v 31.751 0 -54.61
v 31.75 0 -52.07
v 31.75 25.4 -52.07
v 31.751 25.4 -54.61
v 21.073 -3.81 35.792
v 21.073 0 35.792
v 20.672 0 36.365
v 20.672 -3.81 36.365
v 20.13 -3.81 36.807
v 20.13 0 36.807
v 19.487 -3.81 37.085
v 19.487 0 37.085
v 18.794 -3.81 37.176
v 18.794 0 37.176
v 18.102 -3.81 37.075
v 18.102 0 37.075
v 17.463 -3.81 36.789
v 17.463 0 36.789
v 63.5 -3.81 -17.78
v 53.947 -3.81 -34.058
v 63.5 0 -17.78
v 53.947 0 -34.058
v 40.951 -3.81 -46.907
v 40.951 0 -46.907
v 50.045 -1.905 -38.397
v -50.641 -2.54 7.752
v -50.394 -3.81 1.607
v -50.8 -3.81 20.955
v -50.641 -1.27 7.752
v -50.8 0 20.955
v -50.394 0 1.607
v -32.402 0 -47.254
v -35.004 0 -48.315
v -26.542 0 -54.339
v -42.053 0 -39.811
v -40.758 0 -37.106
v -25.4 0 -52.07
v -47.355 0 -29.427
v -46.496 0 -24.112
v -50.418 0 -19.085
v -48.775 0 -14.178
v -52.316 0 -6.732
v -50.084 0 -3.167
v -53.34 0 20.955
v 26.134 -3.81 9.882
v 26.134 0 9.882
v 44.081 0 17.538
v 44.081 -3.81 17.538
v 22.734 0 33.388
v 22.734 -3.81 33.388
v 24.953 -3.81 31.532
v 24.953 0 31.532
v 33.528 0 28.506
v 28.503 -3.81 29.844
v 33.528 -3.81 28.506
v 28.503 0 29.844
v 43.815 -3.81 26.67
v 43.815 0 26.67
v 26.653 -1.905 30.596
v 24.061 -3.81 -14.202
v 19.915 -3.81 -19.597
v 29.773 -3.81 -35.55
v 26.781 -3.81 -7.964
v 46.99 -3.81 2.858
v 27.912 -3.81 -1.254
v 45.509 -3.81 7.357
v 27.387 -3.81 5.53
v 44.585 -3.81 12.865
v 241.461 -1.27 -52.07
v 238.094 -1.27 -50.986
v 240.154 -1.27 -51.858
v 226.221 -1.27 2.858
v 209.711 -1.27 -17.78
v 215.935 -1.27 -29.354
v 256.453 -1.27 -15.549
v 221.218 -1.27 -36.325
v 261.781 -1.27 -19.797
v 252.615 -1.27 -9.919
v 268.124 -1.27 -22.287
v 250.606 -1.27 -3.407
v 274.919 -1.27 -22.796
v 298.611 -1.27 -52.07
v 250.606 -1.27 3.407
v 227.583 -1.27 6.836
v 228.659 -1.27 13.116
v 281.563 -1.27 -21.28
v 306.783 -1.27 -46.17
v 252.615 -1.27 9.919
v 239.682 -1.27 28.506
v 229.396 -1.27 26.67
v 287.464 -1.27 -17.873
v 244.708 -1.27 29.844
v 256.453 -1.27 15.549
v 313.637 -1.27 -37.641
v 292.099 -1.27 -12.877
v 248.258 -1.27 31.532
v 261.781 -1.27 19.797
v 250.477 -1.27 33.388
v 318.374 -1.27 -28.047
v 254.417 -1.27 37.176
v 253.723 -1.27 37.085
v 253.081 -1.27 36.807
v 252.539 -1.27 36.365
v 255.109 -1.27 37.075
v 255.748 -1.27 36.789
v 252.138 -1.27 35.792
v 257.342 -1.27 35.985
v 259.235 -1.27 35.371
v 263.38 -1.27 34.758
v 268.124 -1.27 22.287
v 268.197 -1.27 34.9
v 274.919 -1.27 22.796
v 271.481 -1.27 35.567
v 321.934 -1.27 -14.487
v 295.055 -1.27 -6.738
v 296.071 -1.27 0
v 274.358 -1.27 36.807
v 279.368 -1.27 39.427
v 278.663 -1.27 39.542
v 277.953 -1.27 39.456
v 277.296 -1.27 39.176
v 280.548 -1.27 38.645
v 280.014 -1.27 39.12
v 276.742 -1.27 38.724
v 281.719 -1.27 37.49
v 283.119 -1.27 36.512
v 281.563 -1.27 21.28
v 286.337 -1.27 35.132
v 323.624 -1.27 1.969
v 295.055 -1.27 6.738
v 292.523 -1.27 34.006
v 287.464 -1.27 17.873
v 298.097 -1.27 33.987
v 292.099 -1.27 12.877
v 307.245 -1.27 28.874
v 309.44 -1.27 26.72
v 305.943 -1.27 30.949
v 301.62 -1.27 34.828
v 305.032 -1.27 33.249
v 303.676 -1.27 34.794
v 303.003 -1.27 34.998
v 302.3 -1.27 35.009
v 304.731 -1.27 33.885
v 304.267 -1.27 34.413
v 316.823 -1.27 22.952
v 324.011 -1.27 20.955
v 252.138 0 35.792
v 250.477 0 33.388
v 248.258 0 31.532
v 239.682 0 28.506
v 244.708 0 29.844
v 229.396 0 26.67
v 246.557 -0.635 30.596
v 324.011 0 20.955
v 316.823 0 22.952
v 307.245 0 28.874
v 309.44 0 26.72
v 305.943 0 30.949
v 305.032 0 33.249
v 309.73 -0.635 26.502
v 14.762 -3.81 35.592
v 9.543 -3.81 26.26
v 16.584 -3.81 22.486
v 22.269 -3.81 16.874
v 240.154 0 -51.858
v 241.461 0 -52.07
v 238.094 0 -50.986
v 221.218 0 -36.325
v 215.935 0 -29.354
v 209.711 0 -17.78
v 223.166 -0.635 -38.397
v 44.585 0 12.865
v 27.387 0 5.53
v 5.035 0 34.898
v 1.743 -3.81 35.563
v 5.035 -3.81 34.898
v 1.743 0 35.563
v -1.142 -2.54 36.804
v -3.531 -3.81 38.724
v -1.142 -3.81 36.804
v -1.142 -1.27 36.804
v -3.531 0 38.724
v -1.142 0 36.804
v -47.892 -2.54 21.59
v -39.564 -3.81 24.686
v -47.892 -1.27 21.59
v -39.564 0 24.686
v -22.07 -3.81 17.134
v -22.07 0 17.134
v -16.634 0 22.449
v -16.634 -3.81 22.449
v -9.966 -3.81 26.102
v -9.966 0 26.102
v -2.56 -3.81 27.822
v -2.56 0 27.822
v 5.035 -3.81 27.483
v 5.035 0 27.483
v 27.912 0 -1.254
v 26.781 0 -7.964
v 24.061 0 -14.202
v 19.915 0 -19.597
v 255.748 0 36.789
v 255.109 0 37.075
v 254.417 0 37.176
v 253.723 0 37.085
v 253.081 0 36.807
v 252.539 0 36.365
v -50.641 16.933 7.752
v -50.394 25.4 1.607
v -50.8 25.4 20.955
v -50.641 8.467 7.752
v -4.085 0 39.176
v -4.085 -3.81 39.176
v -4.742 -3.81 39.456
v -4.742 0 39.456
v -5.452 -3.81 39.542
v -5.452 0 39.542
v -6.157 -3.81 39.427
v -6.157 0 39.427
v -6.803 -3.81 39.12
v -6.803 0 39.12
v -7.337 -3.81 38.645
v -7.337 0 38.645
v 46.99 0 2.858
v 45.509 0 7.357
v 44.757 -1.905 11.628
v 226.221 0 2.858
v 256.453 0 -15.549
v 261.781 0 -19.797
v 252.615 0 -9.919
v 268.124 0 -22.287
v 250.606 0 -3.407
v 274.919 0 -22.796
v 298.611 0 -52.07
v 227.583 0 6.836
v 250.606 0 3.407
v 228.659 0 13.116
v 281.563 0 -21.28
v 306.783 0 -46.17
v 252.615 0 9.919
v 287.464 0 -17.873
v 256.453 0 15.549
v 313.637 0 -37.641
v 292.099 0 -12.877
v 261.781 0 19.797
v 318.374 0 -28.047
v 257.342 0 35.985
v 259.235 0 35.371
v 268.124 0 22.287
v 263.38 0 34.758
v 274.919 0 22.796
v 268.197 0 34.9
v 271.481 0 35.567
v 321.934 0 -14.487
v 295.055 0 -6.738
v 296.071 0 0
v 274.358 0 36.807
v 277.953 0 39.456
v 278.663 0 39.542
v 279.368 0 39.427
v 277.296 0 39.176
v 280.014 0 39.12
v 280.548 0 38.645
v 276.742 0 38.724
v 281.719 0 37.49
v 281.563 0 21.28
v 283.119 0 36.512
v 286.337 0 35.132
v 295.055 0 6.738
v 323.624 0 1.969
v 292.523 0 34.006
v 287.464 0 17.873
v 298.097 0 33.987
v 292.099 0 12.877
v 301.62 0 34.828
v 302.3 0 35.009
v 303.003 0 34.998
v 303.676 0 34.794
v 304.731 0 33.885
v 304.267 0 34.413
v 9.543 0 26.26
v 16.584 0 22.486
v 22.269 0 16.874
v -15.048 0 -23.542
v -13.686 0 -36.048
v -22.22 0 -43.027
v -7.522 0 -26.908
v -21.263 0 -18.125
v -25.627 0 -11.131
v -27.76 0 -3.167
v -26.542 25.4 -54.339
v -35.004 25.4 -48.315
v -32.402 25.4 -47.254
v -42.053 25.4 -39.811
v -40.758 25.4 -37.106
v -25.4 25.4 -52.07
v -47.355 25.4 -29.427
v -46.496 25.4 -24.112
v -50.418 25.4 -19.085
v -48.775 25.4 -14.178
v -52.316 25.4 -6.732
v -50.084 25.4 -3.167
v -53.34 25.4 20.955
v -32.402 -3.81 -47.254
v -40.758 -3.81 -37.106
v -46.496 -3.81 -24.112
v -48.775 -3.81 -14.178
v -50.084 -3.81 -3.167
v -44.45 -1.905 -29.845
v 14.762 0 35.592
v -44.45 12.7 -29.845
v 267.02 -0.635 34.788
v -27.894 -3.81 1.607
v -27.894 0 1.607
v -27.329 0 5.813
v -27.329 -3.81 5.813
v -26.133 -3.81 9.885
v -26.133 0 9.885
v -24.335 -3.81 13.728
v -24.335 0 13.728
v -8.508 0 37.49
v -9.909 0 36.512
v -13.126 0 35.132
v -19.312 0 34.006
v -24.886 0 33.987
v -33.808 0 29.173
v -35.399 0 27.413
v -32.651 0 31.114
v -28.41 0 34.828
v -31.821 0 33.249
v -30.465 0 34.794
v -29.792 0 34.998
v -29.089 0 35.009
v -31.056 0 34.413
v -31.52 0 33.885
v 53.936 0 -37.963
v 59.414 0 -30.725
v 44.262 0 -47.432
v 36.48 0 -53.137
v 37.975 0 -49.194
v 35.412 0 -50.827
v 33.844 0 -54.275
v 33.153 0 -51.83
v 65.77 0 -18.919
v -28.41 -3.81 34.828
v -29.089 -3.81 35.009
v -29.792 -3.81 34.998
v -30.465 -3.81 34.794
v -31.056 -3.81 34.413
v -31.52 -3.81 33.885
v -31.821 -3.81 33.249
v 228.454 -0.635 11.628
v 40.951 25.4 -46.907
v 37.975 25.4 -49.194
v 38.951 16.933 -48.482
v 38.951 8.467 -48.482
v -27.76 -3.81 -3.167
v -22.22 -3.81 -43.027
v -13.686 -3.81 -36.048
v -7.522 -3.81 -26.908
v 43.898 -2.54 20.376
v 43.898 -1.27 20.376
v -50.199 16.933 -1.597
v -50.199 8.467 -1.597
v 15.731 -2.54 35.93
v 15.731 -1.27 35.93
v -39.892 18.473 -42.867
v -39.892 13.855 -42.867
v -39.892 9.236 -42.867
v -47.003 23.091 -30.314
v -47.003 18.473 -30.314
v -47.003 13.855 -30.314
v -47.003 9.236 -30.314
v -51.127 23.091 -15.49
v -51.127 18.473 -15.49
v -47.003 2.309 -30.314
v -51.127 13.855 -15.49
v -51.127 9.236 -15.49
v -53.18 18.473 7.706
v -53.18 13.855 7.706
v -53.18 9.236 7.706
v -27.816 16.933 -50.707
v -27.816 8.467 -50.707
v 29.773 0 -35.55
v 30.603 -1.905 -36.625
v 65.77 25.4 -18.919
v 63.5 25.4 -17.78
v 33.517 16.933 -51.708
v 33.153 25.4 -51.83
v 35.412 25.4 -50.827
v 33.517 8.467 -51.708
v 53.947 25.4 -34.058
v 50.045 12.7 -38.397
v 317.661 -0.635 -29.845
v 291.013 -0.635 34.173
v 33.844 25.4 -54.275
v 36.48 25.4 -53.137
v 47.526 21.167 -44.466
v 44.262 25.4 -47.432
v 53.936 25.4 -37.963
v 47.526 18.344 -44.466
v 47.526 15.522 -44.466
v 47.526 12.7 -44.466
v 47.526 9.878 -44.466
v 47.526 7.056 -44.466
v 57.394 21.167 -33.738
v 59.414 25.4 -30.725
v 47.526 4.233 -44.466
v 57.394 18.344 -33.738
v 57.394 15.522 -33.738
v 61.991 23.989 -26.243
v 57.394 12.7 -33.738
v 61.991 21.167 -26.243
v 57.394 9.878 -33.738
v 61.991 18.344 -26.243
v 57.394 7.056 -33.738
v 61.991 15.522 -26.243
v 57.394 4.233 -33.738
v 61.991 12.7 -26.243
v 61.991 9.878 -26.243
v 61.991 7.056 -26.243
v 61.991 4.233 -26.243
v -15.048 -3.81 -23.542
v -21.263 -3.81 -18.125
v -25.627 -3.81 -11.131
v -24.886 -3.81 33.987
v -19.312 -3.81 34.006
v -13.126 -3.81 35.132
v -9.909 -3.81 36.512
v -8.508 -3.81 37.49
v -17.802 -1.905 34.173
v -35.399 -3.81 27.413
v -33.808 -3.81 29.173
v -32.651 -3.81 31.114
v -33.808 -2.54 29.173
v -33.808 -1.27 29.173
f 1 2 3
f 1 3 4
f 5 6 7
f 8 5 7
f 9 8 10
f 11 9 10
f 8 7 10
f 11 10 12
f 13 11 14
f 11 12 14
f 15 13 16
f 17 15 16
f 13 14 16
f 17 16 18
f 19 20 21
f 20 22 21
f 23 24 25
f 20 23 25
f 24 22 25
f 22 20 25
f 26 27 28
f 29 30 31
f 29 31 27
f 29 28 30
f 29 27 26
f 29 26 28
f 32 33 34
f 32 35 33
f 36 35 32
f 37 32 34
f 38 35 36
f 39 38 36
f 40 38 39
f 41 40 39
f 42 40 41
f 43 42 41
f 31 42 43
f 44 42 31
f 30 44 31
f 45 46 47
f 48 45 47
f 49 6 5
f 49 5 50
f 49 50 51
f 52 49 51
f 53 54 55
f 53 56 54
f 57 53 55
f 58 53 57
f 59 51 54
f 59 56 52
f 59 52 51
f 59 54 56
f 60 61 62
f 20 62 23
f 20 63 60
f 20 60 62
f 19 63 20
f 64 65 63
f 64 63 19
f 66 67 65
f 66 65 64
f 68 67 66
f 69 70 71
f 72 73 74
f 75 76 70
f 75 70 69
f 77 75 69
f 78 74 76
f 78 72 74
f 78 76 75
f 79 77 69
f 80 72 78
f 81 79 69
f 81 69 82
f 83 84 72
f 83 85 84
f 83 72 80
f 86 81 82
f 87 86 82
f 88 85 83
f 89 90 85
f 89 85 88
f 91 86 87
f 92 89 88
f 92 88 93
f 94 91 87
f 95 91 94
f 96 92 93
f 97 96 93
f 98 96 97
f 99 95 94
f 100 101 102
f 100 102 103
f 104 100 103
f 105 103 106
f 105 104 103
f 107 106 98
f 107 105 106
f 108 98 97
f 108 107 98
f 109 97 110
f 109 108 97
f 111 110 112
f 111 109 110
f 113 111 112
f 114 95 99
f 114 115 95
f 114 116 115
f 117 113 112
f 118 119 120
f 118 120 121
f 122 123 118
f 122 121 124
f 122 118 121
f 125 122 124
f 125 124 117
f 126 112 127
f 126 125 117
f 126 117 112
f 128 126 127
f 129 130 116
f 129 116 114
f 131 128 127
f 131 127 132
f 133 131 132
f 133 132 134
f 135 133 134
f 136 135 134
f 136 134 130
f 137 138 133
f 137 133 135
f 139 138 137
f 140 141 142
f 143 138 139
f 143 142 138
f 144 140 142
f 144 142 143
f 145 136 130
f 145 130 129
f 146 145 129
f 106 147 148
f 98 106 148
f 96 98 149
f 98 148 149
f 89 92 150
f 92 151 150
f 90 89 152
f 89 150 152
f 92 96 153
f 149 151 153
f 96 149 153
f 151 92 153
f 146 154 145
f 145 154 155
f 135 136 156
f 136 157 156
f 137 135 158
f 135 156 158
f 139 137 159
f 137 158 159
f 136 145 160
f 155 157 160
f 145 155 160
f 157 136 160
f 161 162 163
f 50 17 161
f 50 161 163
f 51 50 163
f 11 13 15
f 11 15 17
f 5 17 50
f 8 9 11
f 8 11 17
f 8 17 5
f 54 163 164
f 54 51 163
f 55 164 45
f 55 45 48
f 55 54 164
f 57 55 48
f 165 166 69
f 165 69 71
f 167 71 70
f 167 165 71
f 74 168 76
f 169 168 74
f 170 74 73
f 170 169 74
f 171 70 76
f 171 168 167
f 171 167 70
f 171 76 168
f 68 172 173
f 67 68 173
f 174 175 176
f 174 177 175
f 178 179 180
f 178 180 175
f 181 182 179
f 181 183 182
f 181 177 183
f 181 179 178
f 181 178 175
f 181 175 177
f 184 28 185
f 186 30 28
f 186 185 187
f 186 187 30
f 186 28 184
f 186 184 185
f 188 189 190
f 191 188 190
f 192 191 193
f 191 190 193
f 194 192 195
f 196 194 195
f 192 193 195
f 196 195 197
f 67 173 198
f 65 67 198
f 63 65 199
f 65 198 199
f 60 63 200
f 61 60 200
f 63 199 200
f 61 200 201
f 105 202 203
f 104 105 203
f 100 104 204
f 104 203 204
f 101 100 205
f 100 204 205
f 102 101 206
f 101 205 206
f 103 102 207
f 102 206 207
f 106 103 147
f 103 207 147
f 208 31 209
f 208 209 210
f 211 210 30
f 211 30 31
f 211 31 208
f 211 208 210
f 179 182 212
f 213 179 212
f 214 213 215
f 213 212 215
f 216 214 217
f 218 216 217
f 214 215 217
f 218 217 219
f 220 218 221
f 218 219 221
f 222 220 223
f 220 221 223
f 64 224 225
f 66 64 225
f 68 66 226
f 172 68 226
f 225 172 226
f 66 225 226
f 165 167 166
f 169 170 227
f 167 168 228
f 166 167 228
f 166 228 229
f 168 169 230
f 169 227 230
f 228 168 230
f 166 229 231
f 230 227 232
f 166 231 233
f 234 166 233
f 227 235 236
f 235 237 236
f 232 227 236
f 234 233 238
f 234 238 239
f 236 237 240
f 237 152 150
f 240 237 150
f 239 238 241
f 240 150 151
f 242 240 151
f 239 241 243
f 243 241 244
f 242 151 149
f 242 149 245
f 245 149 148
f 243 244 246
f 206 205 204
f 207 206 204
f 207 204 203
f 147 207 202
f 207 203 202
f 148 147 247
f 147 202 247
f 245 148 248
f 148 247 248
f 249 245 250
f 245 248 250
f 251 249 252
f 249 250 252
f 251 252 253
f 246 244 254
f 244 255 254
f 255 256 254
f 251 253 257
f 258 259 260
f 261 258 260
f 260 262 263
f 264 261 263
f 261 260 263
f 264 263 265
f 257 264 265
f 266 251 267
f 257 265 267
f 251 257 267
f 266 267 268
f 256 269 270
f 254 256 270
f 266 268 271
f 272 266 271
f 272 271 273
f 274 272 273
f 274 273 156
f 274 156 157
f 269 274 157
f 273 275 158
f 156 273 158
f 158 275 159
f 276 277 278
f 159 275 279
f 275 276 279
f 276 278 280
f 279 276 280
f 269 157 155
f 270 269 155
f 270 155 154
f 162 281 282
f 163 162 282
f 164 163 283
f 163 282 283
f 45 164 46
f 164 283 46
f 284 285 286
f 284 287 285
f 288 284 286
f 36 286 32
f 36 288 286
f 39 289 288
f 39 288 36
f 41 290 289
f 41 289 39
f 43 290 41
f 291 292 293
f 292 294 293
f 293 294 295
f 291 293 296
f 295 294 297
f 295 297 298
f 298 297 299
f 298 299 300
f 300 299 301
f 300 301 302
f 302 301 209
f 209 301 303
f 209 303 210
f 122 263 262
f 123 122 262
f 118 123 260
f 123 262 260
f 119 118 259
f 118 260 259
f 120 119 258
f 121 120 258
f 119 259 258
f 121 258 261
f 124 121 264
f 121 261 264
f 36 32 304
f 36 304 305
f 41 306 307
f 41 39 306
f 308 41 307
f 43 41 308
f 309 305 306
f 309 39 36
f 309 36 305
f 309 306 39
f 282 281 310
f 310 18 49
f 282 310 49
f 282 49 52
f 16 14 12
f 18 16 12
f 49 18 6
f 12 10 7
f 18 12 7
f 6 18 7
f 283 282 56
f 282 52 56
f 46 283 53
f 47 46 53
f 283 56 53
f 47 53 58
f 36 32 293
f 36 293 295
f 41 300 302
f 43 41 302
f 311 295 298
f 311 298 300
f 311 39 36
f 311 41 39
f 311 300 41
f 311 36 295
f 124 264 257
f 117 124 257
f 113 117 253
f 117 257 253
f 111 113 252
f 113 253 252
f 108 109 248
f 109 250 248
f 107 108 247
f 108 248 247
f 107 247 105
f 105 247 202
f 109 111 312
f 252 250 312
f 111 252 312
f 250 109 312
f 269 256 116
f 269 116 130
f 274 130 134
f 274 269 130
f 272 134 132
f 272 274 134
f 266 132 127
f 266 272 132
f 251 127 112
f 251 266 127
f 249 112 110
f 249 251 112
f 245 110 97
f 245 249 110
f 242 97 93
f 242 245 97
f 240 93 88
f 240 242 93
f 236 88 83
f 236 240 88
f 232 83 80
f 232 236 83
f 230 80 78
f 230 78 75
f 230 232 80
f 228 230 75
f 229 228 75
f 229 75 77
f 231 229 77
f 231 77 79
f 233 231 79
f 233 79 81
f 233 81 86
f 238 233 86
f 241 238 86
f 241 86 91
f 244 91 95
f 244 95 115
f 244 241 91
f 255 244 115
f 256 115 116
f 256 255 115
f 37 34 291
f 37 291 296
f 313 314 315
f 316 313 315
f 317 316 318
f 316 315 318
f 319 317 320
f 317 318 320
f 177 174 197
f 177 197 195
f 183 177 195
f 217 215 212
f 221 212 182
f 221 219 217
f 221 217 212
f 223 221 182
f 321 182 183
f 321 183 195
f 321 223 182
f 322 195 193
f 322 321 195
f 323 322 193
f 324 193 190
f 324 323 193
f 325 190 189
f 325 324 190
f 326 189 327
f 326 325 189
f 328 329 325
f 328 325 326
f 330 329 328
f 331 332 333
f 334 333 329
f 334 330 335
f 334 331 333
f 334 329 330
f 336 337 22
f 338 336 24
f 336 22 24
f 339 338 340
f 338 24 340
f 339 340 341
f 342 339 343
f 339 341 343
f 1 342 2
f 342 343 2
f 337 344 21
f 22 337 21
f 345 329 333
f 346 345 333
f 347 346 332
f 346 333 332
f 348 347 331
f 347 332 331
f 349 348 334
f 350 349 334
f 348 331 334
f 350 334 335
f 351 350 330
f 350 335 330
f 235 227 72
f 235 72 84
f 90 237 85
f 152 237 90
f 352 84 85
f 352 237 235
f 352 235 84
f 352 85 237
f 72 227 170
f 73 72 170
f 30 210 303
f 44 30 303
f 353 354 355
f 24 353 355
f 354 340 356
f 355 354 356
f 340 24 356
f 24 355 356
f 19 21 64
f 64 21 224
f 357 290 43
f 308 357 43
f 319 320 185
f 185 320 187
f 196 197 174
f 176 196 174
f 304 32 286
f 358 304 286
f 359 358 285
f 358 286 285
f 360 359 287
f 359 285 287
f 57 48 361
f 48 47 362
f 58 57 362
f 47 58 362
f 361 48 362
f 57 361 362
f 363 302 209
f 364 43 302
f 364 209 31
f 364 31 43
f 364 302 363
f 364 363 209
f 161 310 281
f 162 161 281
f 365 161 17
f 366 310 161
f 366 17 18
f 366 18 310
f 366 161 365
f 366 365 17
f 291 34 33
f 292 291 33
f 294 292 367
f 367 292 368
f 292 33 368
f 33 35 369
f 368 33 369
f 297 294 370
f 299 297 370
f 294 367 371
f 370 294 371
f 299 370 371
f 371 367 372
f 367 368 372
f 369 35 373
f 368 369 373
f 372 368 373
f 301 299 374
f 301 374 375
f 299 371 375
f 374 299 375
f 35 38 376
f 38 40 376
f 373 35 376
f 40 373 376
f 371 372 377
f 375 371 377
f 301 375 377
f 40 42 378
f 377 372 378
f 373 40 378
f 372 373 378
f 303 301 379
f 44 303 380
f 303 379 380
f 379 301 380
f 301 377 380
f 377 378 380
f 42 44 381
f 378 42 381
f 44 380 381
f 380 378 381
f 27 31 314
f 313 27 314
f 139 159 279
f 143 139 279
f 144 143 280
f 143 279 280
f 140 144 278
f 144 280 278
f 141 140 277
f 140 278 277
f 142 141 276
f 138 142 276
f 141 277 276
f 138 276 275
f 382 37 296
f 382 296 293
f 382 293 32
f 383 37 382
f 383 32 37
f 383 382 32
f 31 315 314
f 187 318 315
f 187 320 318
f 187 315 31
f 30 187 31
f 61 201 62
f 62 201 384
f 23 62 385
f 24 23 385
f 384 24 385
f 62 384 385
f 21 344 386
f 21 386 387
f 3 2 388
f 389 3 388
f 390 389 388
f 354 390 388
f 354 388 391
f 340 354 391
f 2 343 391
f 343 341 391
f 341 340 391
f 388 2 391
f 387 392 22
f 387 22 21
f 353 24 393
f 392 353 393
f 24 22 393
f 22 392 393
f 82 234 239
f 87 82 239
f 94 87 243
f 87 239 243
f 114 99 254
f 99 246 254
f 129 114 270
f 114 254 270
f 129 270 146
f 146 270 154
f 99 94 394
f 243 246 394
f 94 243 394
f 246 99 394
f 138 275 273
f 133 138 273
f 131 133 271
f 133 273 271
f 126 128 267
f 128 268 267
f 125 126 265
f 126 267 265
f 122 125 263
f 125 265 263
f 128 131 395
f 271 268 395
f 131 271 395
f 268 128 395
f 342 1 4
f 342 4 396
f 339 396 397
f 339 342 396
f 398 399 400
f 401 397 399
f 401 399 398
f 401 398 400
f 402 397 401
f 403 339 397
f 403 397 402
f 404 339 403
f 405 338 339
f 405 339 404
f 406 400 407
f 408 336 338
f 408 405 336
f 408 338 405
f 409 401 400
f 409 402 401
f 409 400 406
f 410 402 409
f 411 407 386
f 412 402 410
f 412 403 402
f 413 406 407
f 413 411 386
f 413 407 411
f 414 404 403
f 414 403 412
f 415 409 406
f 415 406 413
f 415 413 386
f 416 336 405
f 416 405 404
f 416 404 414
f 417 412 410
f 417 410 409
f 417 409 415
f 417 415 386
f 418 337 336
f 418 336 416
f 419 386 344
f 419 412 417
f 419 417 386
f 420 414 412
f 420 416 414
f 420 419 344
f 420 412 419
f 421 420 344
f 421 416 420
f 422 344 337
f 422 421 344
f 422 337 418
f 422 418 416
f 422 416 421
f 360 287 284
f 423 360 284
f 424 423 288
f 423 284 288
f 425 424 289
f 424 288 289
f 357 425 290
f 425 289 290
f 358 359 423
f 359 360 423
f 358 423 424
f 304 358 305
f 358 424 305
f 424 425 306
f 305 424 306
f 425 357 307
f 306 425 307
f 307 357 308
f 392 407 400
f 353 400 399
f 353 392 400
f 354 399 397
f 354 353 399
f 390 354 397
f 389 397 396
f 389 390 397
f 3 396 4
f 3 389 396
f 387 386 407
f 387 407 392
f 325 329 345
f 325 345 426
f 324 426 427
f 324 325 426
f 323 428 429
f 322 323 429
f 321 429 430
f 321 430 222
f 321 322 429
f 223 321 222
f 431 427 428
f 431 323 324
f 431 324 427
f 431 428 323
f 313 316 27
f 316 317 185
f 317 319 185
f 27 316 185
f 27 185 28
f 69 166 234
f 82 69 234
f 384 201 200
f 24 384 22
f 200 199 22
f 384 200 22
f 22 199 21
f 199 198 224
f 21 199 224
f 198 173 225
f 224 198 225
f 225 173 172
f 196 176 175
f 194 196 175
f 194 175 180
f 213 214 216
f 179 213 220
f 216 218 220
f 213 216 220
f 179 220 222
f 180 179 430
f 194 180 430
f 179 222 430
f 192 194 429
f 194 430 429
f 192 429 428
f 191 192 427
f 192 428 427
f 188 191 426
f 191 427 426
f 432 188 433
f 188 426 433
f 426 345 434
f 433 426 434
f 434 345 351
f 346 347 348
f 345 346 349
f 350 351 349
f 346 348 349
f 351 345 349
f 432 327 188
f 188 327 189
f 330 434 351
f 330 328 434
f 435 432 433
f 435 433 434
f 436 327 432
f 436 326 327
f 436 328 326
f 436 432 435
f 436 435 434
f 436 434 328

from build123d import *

# Parameters (mm, degrees)
F1_DEPTH = 3.81
F2_DEPTH = 25.4
F0_R     = 22.86
F3_DEPTH = 1.27


# Not quite as in the source:
# - the dataset's text gives a spline's control points without its knots; the knots are read off the source's solid


with BuildPart() as f1:
    # F0 (on Front) → F1 (new body)
    with BuildSketch(Plane.XZ):
        with BuildLine():
            add(Edge.make_bspline(
                [(-32.4015982609, -47.2542967092), (-37.3545101899, -42.8550868765), (-46.2039408348, -30.0827942932), (-49.2886590635, -13.3112173003), (-50.0835223991, -3.1672286712)],
                knots=[0.1324377854, 0.1324377854, 0.1324377854, 0.1324377854, 0.4305745002, 0.7612639779, 0.7612639779, 0.7612639779, 0.7612639779], degree=3))
            ThreePointArc((-32.4015982609, -47.2542967092), (-17.6981427389, -39.8494489219), (-7.5220542761, -26.90840574))
            ThreePointArc((-7.5220542761, -26.90840574), (-21.2629963717, -18.1253575219), (-27.7599038641, -3.1672286712))
            Line((-27.7599038641, -3.1672286712), (-50.0835223991, -3.1672286712))
        make_face()
    extrude(amount=F1_DEPTH)


with BuildPart() as f1b:
    # F0 (on Front) → F1, piece 2 (new body)
    with BuildSketch(Plane.XZ):
        with BuildLine():
            add(Edge.make_bspline(
                [(-50.3942953675, 1.6068994458), (-50.7116523317, 7.6046741304), (-50.8, 14.040708595), (-50.8, 20.955)],
                knots=[0.8121129163, 0.8121129163, 0.8121129163, 0.8121129163, 1, 1, 1, 1], degree=3))
            Line((-50.3942953675, 1.6068994458), (-27.8937533181, 1.6068994458))
            ThreePointArc((-27.8937533181, 1.6068994458), (-26.8082807521, 7.8714473331), (-24.3346381376, 13.728400734))
            Line((-24.3346381376, 13.728400734), (-39.5643113353, 24.685851328))
            add(Edge.make_bspline(
                [(-50.8, 20.955), (-48.7586294455, 21.2383932933), (-43.6710240911, 22.6255829589), (-39.5643113353, 24.685851328)],
                knots=[0, 0, 0, 0, 0.4195234448, 0.4195234448, 0.4195234448, 0.4195234448], degree=3))
        make_face()
    extrude(amount=F1_DEPTH)


with BuildPart() as f1c:
    # F0 (on Front) → F1, piece 3 (new body)
    with BuildSketch(Plane.XZ):
        with BuildLine():
            add(Edge.make_bspline(
                [(19.914929673, -19.5969175158), (23.6612726725, -25.9838738604), (29.5150758275, -36.8834797497), (37.494373544, -43.9061090328), (40.9513666547, -46.9066246366)],
                knots=[0, 0, 0, 0, 0.5400159495, 1, 1, 1, 1], degree=3))
            add(Edge.make_bspline(
                [(40.9513666547, -46.9066246366), (44.1733718974, -44.2593550986), (54.7370471064, -34.0134404836), (57.6018359563, -29.538032362), (63.5, -17.78)],
                knots=[0.2576942768, 0.2576942768, 0.2576942768, 0.2576942768, 0.4906190831, 1, 1, 1, 1], degree=3))
            Line((63.5, -17.78), (46.99, 2.8575))
            add(Edge.make_bspline(
                [(46.99, 2.8575), (45.862430977, 5.0832937801), (45.1728056088, 8.6289787064), (44.6399921579, 12.4485812477), (44.5846144842, 12.8645142485)],
                knots=[0, 0, 0, 0, 0.4365870001, 0.489378166, 0.489378166, 0.489378166, 0.489378166], degree=3))
            Line((44.5846144842, 12.8645142485), (27.3873225339, 5.5297526549))
            ThreePointArc((27.3873225339, 5.5297526549), (26.7808355812, -7.9643232966), (19.914929673, -19.5969175158))
        make_face()
    extrude(amount=F1_DEPTH)


with BuildPart() as f1d:
    # F0 (on Front) → F1, piece 4 (new body)
    with BuildSketch(Plane.XZ):
        with BuildLine():
            add(Edge.make_bspline(
                [(-35.3985657611, 27.4131491477), (-33.5545344545, 29.0862015789), (-32.5238587747, 31.0124628081), (-31.8214549811, 33.2492936319)],
                knots=[0.5850244101, 0.5850244101, 0.5850244101, 0.5850244101, 0.8620266084, 0.8620266084, 0.8620266084, 0.8620266084], degree=3))
            Line((-35.3985657611, 27.4131491477), (-22.0697075917, 17.1339314466))
            ThreePointArc((-22.0697075917, 17.1339314466), (-9.9658017904, 26.1022296878), (5.035185755, 27.4825490887))
            Line((5.035185755, 27.4825490887), (5.035185755, 34.8978384418))
            add(Edge.make_bspline(
                [(-3.5313723507, 38.7236903364), (-1.4189307014, 36.4309038194), (1.5678475341, 35.3090215627), (5.035185755, 34.8978384418)],
                knots=[0.1270665909, 0.1270665909, 0.1270665909, 0.1270665909, 0.4578818969, 0.4578818969, 0.4578818969, 0.4578818969], degree=3))
            ThreePointArc((-3.5313723507, 38.7236903364), (-5.4519924297, 39.5420641845), (-7.337073828, 38.6448544183))
            add(Edge.make_bspline(
                [(-28.4095240871, 34.8280412728), (-25.6780710844, 33.673919279), (-17.1351502938, 33.689358767), (-9.7101082233, 35.8449091476), (-7.337073828, 38.6448544183)],
                knots=[0.1407427733, 0.1407427733, 0.1407427733, 0.1407427733, 0.4904519108, 0.8757713542, 0.8757713542, 0.8757713542, 0.8757713542], degree=3))
            ThreePointArc((-28.4095240871, 34.8280412728), (-30.4647659531, 34.7935107051), (-31.8214549811, 33.2492936319))
        make_face()
    extrude(amount=F1_DEPTH)


with BuildPart() as f1e:
    # F0 (on Front) → F1, piece 5 (new body)
    with BuildSketch(Plane.XZ):
        with BuildLine():
            ThreePointArc((9.5431544801, 26.2596992094), (19.6282702033, 19.8840289888), (26.1339604159, 9.882292901))
            Line((26.1339604159, 9.882292901), (44.0812421649, 17.5375147581))
            add(Edge.make_bspline(
                [(44.0812421649, 17.5375147581), (43.858115131, 20.2905449954), (43.7488704096, 23.2816558809), (43.815, 26.67)],
                knots=[0.6792819517, 0.6792819517, 0.6792819517, 0.6792819517, 1, 1, 1, 1], degree=3))
            add(Edge.make_bspline(
                [(21.0728423917, 35.7919701026), (22.28828545, 33.4127117189), (27.5077311439, 28.806695039), (37.8716832047, 27.8394519795), (43.815, 26.67)],
                knots=[0.1348798284, 0.1348798284, 0.1348798284, 0.1348798284, 0.4426747117, 1, 1, 1, 1], degree=3))
            ThreePointArc((21.0728423917, 35.7919701026), (19.4874893399, 37.084686082), (17.4633046468, 36.7894993108))
            add(Edge.make_bspline(
                [(14.7616470372, 35.5920521842), (15.7595866428, 35.900713839), (16.6759917562, 36.2967184021), (17.4633046468, 36.7894993108)],
                knots=[0.7586250088, 0.7586250088, 0.7586250088, 0.7586250088, 0.8607304966, 0.8607304966, 0.8607304966, 0.8607304966], degree=3))
            Line((14.7616470372, 35.5920521842), (9.5431544801, 26.2596992094))
        make_face()
    extrude(amount=F1_DEPTH)


with BuildPart() as f2:
    # F0 (on Front) → F2 (new body)
    with BuildSketch(Plane.XZ):
        with BuildLine():
            Line((-26.5420038104, -54.3387961377), (-25.4, -52.07))
            add(Edge.make_bspline(
                [(-25.4, -52.07), (-27.8518213277, -50.8358700348), (-30.2014241314, -49.2085062334), (-32.4015982609, -47.2542967092)],
                knots=[0, 0, 0, 0, 0.1324377854, 0.1324377854, 0.1324377854, 0.1324377854], degree=3))
            add(Edge.make_bspline(
                [(-32.4015982609, -47.2542967092), (-37.3545101899, -42.8550868765), (-46.2039408348, -30.0827942932), (-49.2886590635, -13.3112173003), (-50.0835223991, -3.1672286712)],
                knots=[0.1324377854, 0.1324377854, 0.1324377854, 0.1324377854, 0.4305745002, 0.7612639779, 0.7612639779, 0.7612639779, 0.7612639779], degree=3))
            add(Edge.make_bspline(
                [(-50.0835223991, -3.1672286712), (-50.2057456917, -1.6074238163), (-50.308407267, -0.0163120564), (-50.3942953675, 1.6068994458)],
                knots=[0.7612639779, 0.7612639779, 0.7612639779, 0.7612639779, 0.8121129163, 0.8121129163, 0.8121129163, 0.8121129163], degree=3))
            add(Edge.make_bspline(
                [(-50.3942953675, 1.6068994458), (-50.7116523317, 7.6046741304), (-50.8, 14.040708595), (-50.8, 20.955)],
                knots=[0.8121129163, 0.8121129163, 0.8121129163, 0.8121129163, 1, 1, 1, 1], degree=3))
            Line((-50.8, 20.955), (-53.3400016963, 20.955))
            add(Edge.make_bspline(
                [(-26.5420038104, -54.3387961377), (-29.0627100455, -53.0699927941), (-33.8490428694, -49.7994585613), (-39.0421158261, -44.2219190116), (-42.6313614699, -39.0406400188), (-45.0149981604, -34.8367031295), (-47.0641498349, -30.3522635024), (-48.7493698024, -25.6395384607), (-50.1060112231, -20.7011376547), (-51.5244817953, -13.8063144268), (-52.6554809616, -4.5873586327), (-53.2616912763, 7.5172788692), (-53.3400016963, 16.3405741938), (-53.3400016963, 20.955)],
                knots=[0, 0, 0, 0, 0.125, 0.25, 0.3125, 0.375, 0.4375, 0.5, 0.5625, 0.625, 0.75, 0.875, 1, 1, 1, 1], degree=3))
        make_face()
    extrude(amount=-F2_DEPTH)


with BuildPart() as f2b:
    # F0 (on Front) → F2, piece 2 (new body)
    with BuildSketch(Plane.XZ):
        with BuildLine():
            add(Edge.make_bspline(
                [(31.75, -52.07), (33.3163124064, -52.0694765021), (35.5326097167, -50.9220271224), (37.9748498683, -49.1938224865)],
                knots=[0, 0, 0, 0, 0.1846780617, 0.1846780617, 0.1846780617, 0.1846780617], degree=3))
            Line((31.75, -52.07), (31.7508489268, -54.6099998581))
            add(Edge.make_bspline(
                [(31.7508489268, -54.6099998581), (32.2256640176, -54.6098411639), (33.1335262146, -54.4951302851), (34.4187918601, -54.110885336), (35.682925068, -53.5675580748), (37.3779369898, -52.6643683647), (39.5484147263, -51.2417084284), (42.2305963042, -49.1791129251), (44.9257896, -46.8787646379), (47.5528122711, -44.4636194039), (49.6099867185, -42.4609157239), (51.1312464786, -40.9269854625), (52.195470601, -39.8299669872), (53.1852172114, -38.7853468766), (54.4235542152, -37.4350675119), (55.8419358132, -35.7893265179), (57.4065121682, -33.7640279942), (59.3953643105, -30.856502217), (61.8771429381, -26.5786619273), (64.3175942448, -21.8149867836), (65.7703642316, -18.918879386)],
                knots=[0, 0, 0, 0, 0.03125, 0.0625, 0.09375, 0.125, 0.1875, 0.25, 0.3125, 0.375, 0.4375, 0.46875, 0.5, 0.53125, 0.5625, 0.625, 0.6875, 0.75, 0.875, 1, 1, 1, 1], degree=3))
            Line((65.7703642316, -18.918879386), (63.5, -17.78))
            add(Edge.make_bspline(
                [(40.9513666547, -46.9066246366), (44.1733718974, -44.2593550986), (54.7370471064, -34.0134404836), (57.6018359563, -29.538032362), (63.5, -17.78)],
                knots=[0.2576942768, 0.2576942768, 0.2576942768, 0.2576942768, 0.4906190831, 1, 1, 1, 1], degree=3))
            add(Edge.make_bspline(
                [(37.9748498683, -49.1938224865), (38.9404390166, -48.5105417529), (39.9413470189, -47.7364787222), (40.9513666547, -46.9066246366)],
                knots=[0.1846780617, 0.1846780617, 0.1846780617, 0.1846780617, 0.2576942768, 0.2576942768, 0.2576942768, 0.2576942768], degree=3))
        make_face()
    extrude(amount=-F2_DEPTH)


with BuildPart() as f3:
    # F0 (on Front) → F3 (new body)
    with BuildSketch(Plane.XZ):
        with BuildLine():
            ThreePointArc((255.7475026767, 36.7894993108), (253.7233179835, 37.084686082), (252.1379649318, 35.7919701026))
            add(Edge.make_bspline(
                [(252.1379649318, 35.7919701026), (250.9225218734, 33.4127117189), (245.7030761795, 28.806695039), (235.3391241187, 27.8394519795), (229.3958073235, 26.67)],
                knots=[0.1348798284, 0.1348798284, 0.1348798284, 0.1348798284, 0.4426747117, 1, 1, 1, 1], degree=3))
            add(Edge.make_bspline(
                [(226.2208073235, 2.8575), (227.3483763465, 5.0832937801), (228.7575633843, 12.3285800892), (229.5119787429, 20.7176155465), (229.3958073235, 26.67)],
                knots=[0, 0, 0, 0, 0.4365870001, 1, 1, 1, 1], degree=3))
            Line((226.2208073235, 2.8575), (209.7108073235, -17.78))
            add(Edge.make_bspline(
                [(241.4608073235, -52.07), (237.29971342, -52.0686092659), (219.4682826462, -35.5670955658), (215.6089713672, -29.538032362), (209.7108073235, -17.78)],
                knots=[0, 0, 0, 0, 0.4906190831, 1, 1, 1, 1], degree=3))
            Line((241.4608073235, -52.07), (298.6108073235, -52.07))
            add(Edge.make_bspline(
                [(298.6108073235, -52.07), (306.5820350195, -48.0576640078), (322.5857309093, -29.0858098177), (324.0108073235, 0), (324.0108073235, 20.955)],
                knots=[0, 0, 0, 0, 0.4305745002, 1, 1, 1, 1], degree=3))
            add(Edge.make_bspline(
                [(324.0108073235, 20.955), (321.4156890461, 21.315267328), (309.2638781363, 24.7808695382), (305.8657632634, 30.5949790437), (305.0322623045, 33.2492936319)],
                knots=[0, 0, 0, 0, 0.5333245143, 0.8620266084, 0.8620266084, 0.8620266084, 0.8620266084], degree=3))
            ThreePointArc((305.0322623045, 33.2492936319), (303.6755732765, 34.7935107051), (301.6203314105, 34.8280412728))
            add(Edge.make_bspline(
                [(301.6203314105, 34.8280412728), (298.8888784079, 33.673919279), (290.3459576173, 33.689358767), (282.9209155468, 35.8449091476), (280.5478811515, 38.6448544183)],
                knots=[0.1407427733, 0.1407427733, 0.1407427733, 0.1407427733, 0.4904519108, 0.8757713542, 0.8757713542, 0.8757713542, 0.8757713542], degree=3))
            ThreePointArc((280.5478811515, 38.6448544183), (278.6627997531, 39.5420641845), (276.7421796741, 38.7236903364))
            add(Edge.make_bspline(
                [(276.7421796741, 38.7236903364), (274.3984555692, 36.1798761539), (267.5622447281, 33.976136877), (258.5744980657, 35.0200765395), (255.7475026767, 36.7894993108)],
                knots=[0.1270665909, 0.1270665909, 0.1270665909, 0.1270665909, 0.4941014897, 0.8607304966, 0.8607304966, 0.8607304966, 0.8607304966], degree=3))
        make_face()
        with Locations((273.2108073235, 0)):
            Circle(F0_R, mode=Mode.SUBTRACT)
    extrude(amount=F3_DEPTH)


solid = Compound([f1.part, f1b.part, f1c.part, f1d.part, f1e.part, f2.part, f2b.part, f3.part])
